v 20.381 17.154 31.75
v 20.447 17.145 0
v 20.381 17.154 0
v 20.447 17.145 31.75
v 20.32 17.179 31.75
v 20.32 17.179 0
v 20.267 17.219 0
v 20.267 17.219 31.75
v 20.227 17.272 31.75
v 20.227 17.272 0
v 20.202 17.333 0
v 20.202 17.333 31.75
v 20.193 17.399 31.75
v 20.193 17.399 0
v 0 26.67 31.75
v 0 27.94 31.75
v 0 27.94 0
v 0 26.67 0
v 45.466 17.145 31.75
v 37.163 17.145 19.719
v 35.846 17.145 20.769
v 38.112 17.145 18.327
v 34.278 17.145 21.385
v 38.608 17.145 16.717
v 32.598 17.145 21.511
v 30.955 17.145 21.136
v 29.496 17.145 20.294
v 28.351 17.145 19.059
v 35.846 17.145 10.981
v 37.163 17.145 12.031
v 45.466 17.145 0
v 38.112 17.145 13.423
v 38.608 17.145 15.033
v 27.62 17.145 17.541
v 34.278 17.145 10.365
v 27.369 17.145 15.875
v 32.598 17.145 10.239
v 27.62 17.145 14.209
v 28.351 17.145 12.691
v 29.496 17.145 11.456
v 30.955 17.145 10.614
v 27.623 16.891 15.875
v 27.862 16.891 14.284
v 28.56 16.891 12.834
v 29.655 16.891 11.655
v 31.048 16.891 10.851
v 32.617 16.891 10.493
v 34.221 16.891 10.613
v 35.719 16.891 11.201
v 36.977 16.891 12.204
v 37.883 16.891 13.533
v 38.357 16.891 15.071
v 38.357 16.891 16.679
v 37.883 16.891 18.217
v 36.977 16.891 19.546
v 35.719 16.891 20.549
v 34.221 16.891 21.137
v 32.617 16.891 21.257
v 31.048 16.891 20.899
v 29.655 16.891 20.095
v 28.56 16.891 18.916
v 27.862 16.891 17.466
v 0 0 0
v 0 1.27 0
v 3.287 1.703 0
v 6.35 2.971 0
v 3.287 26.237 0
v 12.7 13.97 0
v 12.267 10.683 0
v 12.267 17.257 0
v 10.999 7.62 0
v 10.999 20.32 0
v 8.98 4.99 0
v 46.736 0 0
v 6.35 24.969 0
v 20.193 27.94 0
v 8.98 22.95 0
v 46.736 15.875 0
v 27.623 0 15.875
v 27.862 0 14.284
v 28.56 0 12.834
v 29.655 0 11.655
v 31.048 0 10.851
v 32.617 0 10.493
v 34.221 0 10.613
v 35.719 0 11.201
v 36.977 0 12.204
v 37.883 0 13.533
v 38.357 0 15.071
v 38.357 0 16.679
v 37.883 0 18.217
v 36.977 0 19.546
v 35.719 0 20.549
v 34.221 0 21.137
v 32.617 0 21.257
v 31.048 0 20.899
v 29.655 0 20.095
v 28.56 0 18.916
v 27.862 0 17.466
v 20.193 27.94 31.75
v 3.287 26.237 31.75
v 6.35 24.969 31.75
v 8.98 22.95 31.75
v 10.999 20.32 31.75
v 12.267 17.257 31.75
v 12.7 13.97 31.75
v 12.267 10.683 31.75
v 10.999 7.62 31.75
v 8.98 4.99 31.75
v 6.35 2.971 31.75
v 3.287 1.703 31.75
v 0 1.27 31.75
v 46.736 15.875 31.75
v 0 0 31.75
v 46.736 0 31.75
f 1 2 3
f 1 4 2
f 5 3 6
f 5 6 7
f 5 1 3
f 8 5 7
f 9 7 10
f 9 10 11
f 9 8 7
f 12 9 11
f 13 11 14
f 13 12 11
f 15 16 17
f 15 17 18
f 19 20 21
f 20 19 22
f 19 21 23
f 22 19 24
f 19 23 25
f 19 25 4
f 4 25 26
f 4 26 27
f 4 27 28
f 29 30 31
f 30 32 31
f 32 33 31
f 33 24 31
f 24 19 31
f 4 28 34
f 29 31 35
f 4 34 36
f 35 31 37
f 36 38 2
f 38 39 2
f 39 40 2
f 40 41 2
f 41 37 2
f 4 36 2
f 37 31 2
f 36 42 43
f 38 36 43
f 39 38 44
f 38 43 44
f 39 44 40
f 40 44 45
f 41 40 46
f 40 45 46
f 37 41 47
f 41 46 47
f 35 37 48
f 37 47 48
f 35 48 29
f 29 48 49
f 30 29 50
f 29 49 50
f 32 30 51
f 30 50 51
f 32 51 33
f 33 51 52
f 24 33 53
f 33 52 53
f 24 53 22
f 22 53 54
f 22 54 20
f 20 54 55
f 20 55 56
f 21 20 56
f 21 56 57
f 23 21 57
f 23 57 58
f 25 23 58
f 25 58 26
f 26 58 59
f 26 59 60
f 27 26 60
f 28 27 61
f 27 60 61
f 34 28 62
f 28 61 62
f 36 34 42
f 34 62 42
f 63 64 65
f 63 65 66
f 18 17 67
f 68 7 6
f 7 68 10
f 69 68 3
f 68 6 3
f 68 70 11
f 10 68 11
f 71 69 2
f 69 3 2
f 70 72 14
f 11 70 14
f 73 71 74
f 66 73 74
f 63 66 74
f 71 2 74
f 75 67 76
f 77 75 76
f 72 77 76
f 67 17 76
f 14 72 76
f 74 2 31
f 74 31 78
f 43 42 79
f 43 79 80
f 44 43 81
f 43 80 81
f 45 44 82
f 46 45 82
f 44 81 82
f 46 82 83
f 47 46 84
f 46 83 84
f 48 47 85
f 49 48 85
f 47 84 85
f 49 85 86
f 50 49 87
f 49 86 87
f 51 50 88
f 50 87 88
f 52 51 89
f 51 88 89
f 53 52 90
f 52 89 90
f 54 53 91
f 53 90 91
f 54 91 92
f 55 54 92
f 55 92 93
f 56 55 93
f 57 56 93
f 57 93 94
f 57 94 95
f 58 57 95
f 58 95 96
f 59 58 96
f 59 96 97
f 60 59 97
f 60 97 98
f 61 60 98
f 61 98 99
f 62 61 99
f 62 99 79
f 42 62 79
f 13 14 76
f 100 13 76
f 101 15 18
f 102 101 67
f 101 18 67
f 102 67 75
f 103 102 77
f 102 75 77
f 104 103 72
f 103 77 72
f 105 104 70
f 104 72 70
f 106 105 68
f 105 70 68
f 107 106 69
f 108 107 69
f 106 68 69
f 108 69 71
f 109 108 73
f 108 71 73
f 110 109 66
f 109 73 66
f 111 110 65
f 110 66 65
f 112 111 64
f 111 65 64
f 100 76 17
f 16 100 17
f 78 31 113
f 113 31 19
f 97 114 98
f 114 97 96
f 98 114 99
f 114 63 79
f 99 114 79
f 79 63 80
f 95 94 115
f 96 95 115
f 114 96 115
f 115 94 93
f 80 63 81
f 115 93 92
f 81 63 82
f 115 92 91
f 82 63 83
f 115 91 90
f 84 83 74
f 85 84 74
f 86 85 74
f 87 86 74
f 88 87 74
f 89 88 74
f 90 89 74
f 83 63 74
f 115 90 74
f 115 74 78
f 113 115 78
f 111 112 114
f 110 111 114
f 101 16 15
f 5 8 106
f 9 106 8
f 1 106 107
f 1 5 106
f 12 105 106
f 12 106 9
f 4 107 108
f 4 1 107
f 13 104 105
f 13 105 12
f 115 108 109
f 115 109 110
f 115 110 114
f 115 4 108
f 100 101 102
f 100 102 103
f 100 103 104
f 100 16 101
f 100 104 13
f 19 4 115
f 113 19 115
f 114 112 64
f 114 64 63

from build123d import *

# Parameters (mm, degrees)
BOSS_EXTRUDE1_DEPTH      = 31.75
X_0_397_DIAMETER_HOLE1_D = 10.795
CHAMFER1_SIZE            = 1.27
CHAMFER2_SIZE            = 0.254
FILLET1_R                = 0.254


with BuildPart() as part:
    # Sketch1 → Boss-Extrude1 (new body)
    with BuildSketch(Plane.XY):
        with BuildLine():
            Line((46.736, 0), (46.736, 17.145))
            Line((46.736, 17.145), (20.193, 17.145))
            Line((20.193, 17.145), (20.193, 27.94))
            Line((20.193, 27.94), (0, 27.94))
            Line((0, 27.94), (0, 26.67))
            ThreePointArc((0, 26.67), (12.7, 13.97), (0, 1.27))
            Line((0, 1.27), (0, 0))
            Line((0, 0), (46.736, 0))
        make_face()
    extrude(amount=BOSS_EXTRUDE1_DEPTH)

    # X (0.397) Diameter Hole1 (through all)
    with Locations(Plane(origin=(0, 17.145, 0), x_dir=(1, 0, 0), z_dir=(0, 1, 0))):
        with Locations((33.02, -15.875)):
            Hole(X_0_397_DIAMETER_HOLE1_D / 2)

    # Chamfer1
    chamfer1_edges = [part.edges().sort_by_distance(p)[0] for p in [
        (46.736, 17.145, 15.875),
    ]]
    chamfer(chamfer1_edges, length=CHAMFER1_SIZE)

    # Chamfer2
    chamfer2_edges = [part.edges().sort_by_distance(p)[0] for p in [
        (38.4175, 17.145, 15.875),
    ]]
    chamfer(chamfer2_edges, length=CHAMFER2_SIZE)

    # Fillet1
    fillet1_edges = [part.edges().sort_by_distance(p)[0] for p in [
        (20.193, 17.145, 15.875),
    ]]
    fillet(fillet1_edges, radius=FILLET1_R)


solid = part.part
